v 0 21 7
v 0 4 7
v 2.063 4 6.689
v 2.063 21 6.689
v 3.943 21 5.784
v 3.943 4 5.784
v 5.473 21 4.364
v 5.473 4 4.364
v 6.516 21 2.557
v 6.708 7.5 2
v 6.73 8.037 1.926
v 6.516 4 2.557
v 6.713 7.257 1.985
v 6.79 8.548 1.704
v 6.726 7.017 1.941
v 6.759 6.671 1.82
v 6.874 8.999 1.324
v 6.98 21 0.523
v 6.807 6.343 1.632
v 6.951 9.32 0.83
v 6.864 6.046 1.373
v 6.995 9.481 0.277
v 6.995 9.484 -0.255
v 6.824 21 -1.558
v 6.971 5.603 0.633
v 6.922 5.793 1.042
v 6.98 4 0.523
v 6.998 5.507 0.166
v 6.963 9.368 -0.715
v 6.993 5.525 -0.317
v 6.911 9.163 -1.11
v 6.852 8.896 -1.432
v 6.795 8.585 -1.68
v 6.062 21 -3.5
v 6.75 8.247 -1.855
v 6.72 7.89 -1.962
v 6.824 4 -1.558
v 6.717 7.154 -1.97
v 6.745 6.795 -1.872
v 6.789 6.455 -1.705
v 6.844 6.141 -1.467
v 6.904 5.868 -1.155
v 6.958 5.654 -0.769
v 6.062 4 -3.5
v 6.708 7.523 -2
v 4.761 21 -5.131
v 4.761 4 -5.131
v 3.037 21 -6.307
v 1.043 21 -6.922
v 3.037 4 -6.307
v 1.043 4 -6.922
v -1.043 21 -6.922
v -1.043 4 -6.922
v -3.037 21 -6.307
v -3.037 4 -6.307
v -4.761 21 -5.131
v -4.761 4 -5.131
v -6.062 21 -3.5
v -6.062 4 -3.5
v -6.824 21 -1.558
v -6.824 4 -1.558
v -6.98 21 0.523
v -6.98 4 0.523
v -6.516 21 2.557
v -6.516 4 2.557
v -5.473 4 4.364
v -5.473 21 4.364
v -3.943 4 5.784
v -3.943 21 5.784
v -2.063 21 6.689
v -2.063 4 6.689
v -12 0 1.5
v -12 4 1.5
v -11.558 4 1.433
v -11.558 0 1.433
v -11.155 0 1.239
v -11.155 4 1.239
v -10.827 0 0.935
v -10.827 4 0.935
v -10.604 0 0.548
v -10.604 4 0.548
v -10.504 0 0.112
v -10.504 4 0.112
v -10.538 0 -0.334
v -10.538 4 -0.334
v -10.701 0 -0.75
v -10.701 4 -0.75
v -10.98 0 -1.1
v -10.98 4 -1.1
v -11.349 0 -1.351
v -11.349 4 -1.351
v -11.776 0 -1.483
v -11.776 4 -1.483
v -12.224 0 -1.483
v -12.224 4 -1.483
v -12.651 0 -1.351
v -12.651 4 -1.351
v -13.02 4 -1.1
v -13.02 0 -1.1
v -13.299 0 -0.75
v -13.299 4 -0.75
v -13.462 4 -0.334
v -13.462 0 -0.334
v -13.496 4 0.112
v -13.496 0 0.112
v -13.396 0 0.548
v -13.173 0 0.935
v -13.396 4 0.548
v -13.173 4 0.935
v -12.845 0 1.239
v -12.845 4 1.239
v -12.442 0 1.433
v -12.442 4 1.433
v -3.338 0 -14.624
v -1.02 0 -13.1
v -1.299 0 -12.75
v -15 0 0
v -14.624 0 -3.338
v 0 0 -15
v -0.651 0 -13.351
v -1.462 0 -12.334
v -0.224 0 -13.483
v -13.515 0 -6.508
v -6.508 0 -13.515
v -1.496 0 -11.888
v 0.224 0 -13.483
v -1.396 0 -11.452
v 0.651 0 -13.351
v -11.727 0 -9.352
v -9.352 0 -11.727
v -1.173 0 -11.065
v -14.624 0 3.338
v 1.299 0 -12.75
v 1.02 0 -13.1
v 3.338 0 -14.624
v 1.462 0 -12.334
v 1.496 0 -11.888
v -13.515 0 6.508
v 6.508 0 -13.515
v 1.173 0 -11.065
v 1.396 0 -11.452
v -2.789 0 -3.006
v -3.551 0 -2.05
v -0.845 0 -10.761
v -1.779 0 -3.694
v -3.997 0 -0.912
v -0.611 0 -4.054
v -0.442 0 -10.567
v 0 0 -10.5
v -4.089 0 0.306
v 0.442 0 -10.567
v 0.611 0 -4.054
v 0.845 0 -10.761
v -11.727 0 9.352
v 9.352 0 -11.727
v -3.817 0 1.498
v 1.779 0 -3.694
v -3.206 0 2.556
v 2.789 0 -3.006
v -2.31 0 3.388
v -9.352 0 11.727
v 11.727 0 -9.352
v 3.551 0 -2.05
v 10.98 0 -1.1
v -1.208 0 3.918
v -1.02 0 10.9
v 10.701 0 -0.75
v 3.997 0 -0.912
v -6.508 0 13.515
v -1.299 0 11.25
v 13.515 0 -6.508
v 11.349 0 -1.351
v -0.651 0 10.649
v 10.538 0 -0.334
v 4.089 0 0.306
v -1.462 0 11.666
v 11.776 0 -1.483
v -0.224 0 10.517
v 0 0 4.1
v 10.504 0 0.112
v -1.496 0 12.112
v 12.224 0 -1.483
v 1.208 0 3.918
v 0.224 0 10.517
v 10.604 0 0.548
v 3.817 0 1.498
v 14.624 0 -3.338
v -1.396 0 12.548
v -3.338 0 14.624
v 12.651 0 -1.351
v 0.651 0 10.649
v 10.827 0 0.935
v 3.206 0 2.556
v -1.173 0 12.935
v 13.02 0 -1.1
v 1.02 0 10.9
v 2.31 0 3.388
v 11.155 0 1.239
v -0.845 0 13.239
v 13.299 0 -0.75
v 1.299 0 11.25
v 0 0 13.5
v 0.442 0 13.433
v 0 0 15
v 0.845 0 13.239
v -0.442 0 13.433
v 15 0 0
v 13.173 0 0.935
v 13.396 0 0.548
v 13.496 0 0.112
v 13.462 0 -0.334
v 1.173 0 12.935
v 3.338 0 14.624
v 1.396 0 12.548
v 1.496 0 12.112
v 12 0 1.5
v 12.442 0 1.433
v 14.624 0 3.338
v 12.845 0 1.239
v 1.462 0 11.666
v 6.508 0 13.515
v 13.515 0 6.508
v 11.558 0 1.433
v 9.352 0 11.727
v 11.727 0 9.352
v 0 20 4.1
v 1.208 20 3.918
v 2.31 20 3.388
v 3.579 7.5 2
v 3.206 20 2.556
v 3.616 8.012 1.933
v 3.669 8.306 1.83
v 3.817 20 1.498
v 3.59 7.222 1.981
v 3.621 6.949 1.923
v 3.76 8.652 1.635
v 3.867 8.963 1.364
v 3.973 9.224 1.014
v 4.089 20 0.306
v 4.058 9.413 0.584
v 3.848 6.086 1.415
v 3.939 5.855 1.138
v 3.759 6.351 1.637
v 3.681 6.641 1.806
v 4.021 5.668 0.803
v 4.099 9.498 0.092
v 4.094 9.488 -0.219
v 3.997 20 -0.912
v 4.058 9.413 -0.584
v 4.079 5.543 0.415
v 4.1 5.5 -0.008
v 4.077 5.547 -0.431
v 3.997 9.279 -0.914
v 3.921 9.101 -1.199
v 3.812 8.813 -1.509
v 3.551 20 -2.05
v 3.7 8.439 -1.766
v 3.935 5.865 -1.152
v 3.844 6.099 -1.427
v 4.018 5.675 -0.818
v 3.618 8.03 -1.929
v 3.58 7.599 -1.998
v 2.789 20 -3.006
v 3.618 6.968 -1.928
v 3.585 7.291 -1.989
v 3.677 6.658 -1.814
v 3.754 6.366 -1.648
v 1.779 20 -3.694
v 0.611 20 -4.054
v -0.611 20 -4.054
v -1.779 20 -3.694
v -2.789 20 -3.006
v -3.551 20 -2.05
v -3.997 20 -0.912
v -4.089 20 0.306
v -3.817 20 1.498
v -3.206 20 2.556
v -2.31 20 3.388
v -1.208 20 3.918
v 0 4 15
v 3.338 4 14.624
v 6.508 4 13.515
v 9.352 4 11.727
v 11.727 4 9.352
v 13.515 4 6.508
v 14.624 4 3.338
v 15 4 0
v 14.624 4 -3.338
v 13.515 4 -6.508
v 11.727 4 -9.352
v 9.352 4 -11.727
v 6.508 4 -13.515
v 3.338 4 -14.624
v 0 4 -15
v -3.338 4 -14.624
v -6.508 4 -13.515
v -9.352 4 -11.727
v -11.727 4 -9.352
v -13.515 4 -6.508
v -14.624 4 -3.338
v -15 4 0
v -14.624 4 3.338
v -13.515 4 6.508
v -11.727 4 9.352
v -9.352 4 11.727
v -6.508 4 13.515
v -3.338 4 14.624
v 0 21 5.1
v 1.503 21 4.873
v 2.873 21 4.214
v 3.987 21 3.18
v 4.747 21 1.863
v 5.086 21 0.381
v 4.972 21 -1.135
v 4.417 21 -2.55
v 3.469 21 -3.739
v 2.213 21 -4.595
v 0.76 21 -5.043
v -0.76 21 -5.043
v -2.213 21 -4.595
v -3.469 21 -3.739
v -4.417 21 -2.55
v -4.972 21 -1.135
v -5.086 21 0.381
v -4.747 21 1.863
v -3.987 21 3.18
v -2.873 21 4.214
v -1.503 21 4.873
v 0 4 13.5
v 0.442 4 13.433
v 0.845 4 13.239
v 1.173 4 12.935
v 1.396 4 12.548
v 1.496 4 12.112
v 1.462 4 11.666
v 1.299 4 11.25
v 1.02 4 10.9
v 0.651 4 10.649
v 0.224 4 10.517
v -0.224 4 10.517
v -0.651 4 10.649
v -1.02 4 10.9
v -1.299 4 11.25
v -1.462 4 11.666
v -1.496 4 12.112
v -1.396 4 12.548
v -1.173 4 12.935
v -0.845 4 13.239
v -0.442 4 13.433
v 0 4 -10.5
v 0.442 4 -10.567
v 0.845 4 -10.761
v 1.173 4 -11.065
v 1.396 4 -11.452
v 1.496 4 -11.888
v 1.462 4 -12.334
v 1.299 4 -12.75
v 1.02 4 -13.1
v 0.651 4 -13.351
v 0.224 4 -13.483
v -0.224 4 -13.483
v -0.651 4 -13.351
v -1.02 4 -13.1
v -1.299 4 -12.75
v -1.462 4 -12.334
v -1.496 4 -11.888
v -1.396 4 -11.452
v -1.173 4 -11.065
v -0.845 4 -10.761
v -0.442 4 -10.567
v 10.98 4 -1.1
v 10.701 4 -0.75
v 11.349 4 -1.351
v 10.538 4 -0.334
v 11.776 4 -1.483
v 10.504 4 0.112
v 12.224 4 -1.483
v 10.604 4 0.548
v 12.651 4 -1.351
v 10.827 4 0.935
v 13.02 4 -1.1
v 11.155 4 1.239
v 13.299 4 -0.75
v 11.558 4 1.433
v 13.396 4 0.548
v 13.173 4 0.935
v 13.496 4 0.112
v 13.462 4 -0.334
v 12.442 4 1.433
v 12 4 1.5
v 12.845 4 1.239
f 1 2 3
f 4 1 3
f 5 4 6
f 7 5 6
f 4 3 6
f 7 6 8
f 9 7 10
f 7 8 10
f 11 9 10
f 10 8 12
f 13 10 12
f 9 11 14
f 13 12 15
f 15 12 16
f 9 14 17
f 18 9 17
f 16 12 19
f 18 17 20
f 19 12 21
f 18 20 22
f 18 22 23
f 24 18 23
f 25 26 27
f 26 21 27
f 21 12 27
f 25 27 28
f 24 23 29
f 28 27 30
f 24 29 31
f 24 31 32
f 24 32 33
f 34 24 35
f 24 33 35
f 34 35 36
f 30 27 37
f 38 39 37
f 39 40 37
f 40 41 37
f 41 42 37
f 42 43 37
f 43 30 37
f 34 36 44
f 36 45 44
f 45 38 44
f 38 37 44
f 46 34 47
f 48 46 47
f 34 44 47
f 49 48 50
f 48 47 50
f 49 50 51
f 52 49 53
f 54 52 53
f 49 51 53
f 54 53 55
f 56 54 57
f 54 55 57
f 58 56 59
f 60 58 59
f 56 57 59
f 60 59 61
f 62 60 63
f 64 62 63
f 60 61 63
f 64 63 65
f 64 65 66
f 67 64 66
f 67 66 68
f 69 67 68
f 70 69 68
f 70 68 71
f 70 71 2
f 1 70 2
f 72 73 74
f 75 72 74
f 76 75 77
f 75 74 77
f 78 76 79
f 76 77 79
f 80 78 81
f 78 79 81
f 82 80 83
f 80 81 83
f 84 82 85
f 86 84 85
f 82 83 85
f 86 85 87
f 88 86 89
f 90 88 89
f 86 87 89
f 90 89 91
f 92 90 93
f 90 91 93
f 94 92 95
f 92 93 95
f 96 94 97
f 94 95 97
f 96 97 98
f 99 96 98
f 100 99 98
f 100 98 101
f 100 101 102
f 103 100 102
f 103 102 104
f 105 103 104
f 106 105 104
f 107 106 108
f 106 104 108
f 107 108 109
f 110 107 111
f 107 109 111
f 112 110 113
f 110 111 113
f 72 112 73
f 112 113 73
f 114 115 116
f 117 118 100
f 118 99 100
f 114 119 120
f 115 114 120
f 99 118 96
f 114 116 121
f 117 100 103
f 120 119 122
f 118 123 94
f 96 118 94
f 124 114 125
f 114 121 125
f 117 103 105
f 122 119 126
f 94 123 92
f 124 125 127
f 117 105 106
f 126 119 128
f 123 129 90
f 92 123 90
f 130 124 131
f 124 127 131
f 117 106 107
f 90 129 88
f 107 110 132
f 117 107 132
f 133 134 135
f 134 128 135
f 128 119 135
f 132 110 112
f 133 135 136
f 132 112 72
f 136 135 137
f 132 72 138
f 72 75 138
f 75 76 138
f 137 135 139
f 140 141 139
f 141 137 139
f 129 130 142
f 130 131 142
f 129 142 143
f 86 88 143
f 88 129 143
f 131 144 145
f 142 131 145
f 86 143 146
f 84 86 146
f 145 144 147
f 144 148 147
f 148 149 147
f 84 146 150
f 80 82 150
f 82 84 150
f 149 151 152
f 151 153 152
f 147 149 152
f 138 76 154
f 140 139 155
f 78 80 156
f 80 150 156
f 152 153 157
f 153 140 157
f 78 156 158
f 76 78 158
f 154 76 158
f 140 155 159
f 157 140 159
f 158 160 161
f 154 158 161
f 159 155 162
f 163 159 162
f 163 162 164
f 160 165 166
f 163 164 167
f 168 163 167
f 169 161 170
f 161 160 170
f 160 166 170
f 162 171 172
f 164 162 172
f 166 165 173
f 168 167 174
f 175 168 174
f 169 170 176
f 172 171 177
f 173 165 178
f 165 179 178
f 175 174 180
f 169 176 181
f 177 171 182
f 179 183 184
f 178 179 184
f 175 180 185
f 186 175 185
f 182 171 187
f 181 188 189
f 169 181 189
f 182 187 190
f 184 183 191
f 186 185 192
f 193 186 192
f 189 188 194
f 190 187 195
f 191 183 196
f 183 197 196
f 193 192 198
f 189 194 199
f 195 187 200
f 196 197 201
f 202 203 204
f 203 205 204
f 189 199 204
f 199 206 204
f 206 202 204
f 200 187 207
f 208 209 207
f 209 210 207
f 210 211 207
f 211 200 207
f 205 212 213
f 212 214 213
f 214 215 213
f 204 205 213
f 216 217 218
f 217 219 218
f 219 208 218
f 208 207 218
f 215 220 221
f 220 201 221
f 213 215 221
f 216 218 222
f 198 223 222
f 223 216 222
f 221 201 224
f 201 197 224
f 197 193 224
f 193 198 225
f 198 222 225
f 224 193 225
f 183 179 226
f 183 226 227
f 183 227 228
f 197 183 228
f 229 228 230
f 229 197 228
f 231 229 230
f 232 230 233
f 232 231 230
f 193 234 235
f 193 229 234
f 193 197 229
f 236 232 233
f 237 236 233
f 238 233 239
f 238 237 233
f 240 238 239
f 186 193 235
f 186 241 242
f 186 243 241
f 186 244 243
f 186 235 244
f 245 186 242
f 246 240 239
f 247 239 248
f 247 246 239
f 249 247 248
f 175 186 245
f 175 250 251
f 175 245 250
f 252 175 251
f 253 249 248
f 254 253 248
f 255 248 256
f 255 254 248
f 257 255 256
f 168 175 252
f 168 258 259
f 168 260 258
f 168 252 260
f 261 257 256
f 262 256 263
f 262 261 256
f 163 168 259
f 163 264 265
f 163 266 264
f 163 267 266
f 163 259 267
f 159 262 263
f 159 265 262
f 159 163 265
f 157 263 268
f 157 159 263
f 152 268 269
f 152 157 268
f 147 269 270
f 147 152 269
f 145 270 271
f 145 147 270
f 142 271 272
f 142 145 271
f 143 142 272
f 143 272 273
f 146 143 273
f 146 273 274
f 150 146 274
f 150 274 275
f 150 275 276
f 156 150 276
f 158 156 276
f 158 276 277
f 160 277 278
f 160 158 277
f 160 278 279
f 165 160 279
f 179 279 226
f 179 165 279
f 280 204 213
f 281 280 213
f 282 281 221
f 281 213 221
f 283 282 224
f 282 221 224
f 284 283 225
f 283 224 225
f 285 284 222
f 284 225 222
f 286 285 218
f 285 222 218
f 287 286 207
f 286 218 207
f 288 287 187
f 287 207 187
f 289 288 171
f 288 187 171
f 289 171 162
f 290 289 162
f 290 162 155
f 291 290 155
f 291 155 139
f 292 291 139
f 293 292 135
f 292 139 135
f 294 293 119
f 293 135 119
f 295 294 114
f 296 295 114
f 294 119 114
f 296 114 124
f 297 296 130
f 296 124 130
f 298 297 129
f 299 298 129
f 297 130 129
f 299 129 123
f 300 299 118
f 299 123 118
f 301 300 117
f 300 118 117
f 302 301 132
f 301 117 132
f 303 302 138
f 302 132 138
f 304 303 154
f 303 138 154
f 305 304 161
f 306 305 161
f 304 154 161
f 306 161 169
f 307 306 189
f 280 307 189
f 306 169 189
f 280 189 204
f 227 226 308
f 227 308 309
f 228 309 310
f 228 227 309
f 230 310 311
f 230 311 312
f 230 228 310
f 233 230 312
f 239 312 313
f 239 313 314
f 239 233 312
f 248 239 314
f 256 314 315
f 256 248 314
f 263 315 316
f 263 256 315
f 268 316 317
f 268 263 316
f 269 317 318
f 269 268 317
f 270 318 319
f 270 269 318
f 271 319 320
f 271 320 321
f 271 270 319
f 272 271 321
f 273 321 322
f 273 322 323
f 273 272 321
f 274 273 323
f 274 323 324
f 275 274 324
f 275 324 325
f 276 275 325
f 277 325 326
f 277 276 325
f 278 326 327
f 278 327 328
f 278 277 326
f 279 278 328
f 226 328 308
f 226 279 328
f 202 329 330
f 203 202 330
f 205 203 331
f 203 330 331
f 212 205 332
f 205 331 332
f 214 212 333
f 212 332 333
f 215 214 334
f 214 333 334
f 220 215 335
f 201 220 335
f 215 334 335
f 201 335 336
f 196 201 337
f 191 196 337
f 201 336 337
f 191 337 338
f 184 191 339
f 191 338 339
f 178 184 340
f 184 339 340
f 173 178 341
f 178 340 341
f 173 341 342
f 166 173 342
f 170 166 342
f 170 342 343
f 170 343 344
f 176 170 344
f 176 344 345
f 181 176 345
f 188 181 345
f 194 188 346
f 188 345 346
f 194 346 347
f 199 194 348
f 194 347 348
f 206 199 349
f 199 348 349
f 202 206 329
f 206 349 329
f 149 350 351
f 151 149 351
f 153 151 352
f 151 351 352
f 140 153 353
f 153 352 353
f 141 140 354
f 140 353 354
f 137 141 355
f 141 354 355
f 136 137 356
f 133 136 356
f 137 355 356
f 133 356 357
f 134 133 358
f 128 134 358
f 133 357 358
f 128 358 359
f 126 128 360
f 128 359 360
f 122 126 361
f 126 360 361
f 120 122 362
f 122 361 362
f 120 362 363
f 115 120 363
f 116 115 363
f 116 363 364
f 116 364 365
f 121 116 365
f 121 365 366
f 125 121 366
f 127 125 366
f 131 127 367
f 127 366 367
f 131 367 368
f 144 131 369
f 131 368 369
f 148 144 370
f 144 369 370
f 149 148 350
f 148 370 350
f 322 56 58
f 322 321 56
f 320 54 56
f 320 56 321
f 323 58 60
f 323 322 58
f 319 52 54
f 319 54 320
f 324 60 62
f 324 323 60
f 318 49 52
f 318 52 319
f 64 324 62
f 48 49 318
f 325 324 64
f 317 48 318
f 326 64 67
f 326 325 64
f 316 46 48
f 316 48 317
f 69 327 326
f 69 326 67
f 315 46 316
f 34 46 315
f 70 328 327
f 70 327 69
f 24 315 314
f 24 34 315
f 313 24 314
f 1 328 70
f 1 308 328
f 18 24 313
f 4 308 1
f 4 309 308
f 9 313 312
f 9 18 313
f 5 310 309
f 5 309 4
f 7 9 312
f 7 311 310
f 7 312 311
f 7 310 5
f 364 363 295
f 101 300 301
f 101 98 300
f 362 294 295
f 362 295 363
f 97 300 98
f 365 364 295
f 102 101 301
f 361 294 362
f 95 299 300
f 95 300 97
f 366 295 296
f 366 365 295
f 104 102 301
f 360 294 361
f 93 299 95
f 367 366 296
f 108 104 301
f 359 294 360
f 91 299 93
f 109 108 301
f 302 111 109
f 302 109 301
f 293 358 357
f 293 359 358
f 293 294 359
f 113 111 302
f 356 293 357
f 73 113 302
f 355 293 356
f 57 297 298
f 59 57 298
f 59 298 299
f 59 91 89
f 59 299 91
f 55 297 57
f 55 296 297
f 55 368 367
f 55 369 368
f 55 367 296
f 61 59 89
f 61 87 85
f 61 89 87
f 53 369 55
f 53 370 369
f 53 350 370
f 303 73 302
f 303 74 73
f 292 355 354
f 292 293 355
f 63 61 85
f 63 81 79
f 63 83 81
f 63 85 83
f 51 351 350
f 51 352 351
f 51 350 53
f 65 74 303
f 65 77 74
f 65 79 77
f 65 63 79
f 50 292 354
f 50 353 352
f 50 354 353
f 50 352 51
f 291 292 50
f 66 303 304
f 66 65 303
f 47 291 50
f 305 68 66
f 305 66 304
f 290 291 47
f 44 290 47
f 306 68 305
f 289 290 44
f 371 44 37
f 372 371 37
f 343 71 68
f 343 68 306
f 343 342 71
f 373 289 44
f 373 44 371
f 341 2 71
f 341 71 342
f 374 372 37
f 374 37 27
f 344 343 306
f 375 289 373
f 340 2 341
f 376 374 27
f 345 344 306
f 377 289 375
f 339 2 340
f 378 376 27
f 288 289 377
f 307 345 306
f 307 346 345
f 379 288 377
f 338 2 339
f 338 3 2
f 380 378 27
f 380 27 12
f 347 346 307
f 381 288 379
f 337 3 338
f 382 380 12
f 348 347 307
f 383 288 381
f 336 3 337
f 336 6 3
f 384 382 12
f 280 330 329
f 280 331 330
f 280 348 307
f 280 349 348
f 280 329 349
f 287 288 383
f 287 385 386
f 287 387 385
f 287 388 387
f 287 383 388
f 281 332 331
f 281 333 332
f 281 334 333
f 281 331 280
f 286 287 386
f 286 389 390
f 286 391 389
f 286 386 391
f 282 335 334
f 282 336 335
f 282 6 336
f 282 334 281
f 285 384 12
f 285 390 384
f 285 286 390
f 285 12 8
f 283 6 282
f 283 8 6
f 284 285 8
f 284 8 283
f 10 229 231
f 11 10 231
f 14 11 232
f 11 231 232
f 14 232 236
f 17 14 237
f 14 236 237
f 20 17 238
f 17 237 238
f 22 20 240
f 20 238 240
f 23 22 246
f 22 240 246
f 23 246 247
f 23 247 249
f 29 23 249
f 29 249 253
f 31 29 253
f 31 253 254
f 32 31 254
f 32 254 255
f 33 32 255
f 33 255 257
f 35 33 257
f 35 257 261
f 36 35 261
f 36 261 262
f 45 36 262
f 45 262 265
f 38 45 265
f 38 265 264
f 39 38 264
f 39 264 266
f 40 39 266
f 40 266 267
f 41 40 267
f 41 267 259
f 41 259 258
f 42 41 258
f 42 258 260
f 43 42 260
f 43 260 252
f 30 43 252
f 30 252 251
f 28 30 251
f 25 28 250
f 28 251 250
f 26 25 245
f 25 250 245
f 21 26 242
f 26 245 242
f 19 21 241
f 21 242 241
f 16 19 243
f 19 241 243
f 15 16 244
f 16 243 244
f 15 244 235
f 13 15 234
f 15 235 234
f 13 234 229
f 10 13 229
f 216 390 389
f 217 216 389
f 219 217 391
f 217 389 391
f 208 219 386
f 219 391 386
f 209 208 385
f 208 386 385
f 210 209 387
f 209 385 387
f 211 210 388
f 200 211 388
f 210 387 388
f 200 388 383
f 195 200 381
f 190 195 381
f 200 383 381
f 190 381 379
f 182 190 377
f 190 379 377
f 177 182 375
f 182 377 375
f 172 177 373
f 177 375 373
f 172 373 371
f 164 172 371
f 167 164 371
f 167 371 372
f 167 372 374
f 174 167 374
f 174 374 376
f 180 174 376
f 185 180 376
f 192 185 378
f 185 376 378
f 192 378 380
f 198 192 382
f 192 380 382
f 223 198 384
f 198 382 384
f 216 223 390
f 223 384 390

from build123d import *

# Parameters (mm, degrees)
SKETCH_1_R          = 15
SKETCH_1_R_2        = 4.1
EXTRUDE_1_DEPTH     = 4
SKETCH_2_R          = 7
SKETCH_2_R_2        = 4.1
EXTRUDE_2_DEPTH     = 17
SKETCH_5_R          = 2
CUT_EXTRUDE_1_DEPTH = 12
SKETCH_7_R          = 1.5
CUT_EXTRUDE_3_DEPTH = 4
CHAMFER_1_SIZE      = 1


with BuildPart() as part:
    # 草图1 → 凸台-拉伸1 (new body)
    with BuildSketch(Plane(origin=(0, 0, 0), x_dir=(1, 0, 0), z_dir=(0, 1, 0))):
        Circle(SKETCH_1_R)
        Circle(SKETCH_1_R_2, mode=Mode.SUBTRACT)
    extrude(amount=EXTRUDE_1_DEPTH)

    # 草图2 → 凸台-拉伸2 (add)
    with BuildSketch(Plane(origin=(0, 4, 0), x_dir=(1, 0, 0), z_dir=(0, 1, 0))):
        Circle(SKETCH_2_R)
        Circle(SKETCH_2_R_2, mode=Mode.SUBTRACT)
    extrude(amount=EXTRUDE_2_DEPTH)

    # 草图5 → 切除-拉伸1 (cut)
    with BuildSketch(Plane.ZY):
        with Locations((0, 7.5)):
            Circle(SKETCH_5_R)
    extrude(amount=-CUT_EXTRUDE_1_DEPTH, mode=Mode.SUBTRACT)

    # 草图7 → 切除-拉伸3 (cut)
    with BuildSketch(Plane(origin=(0, 4, 0), x_dir=(1, 0, 0), z_dir=(0, 1, 0))):
        with Locations((0, -12)):
            Circle(SKETCH_7_R)
        with Locations((-12, 0)):
            Circle(SKETCH_7_R)
        with Locations((0, 12)):
            Circle(SKETCH_7_R)
        with Locations((12, 0)):
            Circle(SKETCH_7_R)
    extrude(amount=-CUT_EXTRUDE_3_DEPTH, mode=Mode.SUBTRACT)

    # 倒角1
    chamfer_1_edges = [part.edges().sort_by_distance(p)[0] for p in [
        (-4.1, 21, 0),
    ]]
    chamfer(chamfer_1_edges, length=CHAMFER_1_SIZE)


solid = part.part
